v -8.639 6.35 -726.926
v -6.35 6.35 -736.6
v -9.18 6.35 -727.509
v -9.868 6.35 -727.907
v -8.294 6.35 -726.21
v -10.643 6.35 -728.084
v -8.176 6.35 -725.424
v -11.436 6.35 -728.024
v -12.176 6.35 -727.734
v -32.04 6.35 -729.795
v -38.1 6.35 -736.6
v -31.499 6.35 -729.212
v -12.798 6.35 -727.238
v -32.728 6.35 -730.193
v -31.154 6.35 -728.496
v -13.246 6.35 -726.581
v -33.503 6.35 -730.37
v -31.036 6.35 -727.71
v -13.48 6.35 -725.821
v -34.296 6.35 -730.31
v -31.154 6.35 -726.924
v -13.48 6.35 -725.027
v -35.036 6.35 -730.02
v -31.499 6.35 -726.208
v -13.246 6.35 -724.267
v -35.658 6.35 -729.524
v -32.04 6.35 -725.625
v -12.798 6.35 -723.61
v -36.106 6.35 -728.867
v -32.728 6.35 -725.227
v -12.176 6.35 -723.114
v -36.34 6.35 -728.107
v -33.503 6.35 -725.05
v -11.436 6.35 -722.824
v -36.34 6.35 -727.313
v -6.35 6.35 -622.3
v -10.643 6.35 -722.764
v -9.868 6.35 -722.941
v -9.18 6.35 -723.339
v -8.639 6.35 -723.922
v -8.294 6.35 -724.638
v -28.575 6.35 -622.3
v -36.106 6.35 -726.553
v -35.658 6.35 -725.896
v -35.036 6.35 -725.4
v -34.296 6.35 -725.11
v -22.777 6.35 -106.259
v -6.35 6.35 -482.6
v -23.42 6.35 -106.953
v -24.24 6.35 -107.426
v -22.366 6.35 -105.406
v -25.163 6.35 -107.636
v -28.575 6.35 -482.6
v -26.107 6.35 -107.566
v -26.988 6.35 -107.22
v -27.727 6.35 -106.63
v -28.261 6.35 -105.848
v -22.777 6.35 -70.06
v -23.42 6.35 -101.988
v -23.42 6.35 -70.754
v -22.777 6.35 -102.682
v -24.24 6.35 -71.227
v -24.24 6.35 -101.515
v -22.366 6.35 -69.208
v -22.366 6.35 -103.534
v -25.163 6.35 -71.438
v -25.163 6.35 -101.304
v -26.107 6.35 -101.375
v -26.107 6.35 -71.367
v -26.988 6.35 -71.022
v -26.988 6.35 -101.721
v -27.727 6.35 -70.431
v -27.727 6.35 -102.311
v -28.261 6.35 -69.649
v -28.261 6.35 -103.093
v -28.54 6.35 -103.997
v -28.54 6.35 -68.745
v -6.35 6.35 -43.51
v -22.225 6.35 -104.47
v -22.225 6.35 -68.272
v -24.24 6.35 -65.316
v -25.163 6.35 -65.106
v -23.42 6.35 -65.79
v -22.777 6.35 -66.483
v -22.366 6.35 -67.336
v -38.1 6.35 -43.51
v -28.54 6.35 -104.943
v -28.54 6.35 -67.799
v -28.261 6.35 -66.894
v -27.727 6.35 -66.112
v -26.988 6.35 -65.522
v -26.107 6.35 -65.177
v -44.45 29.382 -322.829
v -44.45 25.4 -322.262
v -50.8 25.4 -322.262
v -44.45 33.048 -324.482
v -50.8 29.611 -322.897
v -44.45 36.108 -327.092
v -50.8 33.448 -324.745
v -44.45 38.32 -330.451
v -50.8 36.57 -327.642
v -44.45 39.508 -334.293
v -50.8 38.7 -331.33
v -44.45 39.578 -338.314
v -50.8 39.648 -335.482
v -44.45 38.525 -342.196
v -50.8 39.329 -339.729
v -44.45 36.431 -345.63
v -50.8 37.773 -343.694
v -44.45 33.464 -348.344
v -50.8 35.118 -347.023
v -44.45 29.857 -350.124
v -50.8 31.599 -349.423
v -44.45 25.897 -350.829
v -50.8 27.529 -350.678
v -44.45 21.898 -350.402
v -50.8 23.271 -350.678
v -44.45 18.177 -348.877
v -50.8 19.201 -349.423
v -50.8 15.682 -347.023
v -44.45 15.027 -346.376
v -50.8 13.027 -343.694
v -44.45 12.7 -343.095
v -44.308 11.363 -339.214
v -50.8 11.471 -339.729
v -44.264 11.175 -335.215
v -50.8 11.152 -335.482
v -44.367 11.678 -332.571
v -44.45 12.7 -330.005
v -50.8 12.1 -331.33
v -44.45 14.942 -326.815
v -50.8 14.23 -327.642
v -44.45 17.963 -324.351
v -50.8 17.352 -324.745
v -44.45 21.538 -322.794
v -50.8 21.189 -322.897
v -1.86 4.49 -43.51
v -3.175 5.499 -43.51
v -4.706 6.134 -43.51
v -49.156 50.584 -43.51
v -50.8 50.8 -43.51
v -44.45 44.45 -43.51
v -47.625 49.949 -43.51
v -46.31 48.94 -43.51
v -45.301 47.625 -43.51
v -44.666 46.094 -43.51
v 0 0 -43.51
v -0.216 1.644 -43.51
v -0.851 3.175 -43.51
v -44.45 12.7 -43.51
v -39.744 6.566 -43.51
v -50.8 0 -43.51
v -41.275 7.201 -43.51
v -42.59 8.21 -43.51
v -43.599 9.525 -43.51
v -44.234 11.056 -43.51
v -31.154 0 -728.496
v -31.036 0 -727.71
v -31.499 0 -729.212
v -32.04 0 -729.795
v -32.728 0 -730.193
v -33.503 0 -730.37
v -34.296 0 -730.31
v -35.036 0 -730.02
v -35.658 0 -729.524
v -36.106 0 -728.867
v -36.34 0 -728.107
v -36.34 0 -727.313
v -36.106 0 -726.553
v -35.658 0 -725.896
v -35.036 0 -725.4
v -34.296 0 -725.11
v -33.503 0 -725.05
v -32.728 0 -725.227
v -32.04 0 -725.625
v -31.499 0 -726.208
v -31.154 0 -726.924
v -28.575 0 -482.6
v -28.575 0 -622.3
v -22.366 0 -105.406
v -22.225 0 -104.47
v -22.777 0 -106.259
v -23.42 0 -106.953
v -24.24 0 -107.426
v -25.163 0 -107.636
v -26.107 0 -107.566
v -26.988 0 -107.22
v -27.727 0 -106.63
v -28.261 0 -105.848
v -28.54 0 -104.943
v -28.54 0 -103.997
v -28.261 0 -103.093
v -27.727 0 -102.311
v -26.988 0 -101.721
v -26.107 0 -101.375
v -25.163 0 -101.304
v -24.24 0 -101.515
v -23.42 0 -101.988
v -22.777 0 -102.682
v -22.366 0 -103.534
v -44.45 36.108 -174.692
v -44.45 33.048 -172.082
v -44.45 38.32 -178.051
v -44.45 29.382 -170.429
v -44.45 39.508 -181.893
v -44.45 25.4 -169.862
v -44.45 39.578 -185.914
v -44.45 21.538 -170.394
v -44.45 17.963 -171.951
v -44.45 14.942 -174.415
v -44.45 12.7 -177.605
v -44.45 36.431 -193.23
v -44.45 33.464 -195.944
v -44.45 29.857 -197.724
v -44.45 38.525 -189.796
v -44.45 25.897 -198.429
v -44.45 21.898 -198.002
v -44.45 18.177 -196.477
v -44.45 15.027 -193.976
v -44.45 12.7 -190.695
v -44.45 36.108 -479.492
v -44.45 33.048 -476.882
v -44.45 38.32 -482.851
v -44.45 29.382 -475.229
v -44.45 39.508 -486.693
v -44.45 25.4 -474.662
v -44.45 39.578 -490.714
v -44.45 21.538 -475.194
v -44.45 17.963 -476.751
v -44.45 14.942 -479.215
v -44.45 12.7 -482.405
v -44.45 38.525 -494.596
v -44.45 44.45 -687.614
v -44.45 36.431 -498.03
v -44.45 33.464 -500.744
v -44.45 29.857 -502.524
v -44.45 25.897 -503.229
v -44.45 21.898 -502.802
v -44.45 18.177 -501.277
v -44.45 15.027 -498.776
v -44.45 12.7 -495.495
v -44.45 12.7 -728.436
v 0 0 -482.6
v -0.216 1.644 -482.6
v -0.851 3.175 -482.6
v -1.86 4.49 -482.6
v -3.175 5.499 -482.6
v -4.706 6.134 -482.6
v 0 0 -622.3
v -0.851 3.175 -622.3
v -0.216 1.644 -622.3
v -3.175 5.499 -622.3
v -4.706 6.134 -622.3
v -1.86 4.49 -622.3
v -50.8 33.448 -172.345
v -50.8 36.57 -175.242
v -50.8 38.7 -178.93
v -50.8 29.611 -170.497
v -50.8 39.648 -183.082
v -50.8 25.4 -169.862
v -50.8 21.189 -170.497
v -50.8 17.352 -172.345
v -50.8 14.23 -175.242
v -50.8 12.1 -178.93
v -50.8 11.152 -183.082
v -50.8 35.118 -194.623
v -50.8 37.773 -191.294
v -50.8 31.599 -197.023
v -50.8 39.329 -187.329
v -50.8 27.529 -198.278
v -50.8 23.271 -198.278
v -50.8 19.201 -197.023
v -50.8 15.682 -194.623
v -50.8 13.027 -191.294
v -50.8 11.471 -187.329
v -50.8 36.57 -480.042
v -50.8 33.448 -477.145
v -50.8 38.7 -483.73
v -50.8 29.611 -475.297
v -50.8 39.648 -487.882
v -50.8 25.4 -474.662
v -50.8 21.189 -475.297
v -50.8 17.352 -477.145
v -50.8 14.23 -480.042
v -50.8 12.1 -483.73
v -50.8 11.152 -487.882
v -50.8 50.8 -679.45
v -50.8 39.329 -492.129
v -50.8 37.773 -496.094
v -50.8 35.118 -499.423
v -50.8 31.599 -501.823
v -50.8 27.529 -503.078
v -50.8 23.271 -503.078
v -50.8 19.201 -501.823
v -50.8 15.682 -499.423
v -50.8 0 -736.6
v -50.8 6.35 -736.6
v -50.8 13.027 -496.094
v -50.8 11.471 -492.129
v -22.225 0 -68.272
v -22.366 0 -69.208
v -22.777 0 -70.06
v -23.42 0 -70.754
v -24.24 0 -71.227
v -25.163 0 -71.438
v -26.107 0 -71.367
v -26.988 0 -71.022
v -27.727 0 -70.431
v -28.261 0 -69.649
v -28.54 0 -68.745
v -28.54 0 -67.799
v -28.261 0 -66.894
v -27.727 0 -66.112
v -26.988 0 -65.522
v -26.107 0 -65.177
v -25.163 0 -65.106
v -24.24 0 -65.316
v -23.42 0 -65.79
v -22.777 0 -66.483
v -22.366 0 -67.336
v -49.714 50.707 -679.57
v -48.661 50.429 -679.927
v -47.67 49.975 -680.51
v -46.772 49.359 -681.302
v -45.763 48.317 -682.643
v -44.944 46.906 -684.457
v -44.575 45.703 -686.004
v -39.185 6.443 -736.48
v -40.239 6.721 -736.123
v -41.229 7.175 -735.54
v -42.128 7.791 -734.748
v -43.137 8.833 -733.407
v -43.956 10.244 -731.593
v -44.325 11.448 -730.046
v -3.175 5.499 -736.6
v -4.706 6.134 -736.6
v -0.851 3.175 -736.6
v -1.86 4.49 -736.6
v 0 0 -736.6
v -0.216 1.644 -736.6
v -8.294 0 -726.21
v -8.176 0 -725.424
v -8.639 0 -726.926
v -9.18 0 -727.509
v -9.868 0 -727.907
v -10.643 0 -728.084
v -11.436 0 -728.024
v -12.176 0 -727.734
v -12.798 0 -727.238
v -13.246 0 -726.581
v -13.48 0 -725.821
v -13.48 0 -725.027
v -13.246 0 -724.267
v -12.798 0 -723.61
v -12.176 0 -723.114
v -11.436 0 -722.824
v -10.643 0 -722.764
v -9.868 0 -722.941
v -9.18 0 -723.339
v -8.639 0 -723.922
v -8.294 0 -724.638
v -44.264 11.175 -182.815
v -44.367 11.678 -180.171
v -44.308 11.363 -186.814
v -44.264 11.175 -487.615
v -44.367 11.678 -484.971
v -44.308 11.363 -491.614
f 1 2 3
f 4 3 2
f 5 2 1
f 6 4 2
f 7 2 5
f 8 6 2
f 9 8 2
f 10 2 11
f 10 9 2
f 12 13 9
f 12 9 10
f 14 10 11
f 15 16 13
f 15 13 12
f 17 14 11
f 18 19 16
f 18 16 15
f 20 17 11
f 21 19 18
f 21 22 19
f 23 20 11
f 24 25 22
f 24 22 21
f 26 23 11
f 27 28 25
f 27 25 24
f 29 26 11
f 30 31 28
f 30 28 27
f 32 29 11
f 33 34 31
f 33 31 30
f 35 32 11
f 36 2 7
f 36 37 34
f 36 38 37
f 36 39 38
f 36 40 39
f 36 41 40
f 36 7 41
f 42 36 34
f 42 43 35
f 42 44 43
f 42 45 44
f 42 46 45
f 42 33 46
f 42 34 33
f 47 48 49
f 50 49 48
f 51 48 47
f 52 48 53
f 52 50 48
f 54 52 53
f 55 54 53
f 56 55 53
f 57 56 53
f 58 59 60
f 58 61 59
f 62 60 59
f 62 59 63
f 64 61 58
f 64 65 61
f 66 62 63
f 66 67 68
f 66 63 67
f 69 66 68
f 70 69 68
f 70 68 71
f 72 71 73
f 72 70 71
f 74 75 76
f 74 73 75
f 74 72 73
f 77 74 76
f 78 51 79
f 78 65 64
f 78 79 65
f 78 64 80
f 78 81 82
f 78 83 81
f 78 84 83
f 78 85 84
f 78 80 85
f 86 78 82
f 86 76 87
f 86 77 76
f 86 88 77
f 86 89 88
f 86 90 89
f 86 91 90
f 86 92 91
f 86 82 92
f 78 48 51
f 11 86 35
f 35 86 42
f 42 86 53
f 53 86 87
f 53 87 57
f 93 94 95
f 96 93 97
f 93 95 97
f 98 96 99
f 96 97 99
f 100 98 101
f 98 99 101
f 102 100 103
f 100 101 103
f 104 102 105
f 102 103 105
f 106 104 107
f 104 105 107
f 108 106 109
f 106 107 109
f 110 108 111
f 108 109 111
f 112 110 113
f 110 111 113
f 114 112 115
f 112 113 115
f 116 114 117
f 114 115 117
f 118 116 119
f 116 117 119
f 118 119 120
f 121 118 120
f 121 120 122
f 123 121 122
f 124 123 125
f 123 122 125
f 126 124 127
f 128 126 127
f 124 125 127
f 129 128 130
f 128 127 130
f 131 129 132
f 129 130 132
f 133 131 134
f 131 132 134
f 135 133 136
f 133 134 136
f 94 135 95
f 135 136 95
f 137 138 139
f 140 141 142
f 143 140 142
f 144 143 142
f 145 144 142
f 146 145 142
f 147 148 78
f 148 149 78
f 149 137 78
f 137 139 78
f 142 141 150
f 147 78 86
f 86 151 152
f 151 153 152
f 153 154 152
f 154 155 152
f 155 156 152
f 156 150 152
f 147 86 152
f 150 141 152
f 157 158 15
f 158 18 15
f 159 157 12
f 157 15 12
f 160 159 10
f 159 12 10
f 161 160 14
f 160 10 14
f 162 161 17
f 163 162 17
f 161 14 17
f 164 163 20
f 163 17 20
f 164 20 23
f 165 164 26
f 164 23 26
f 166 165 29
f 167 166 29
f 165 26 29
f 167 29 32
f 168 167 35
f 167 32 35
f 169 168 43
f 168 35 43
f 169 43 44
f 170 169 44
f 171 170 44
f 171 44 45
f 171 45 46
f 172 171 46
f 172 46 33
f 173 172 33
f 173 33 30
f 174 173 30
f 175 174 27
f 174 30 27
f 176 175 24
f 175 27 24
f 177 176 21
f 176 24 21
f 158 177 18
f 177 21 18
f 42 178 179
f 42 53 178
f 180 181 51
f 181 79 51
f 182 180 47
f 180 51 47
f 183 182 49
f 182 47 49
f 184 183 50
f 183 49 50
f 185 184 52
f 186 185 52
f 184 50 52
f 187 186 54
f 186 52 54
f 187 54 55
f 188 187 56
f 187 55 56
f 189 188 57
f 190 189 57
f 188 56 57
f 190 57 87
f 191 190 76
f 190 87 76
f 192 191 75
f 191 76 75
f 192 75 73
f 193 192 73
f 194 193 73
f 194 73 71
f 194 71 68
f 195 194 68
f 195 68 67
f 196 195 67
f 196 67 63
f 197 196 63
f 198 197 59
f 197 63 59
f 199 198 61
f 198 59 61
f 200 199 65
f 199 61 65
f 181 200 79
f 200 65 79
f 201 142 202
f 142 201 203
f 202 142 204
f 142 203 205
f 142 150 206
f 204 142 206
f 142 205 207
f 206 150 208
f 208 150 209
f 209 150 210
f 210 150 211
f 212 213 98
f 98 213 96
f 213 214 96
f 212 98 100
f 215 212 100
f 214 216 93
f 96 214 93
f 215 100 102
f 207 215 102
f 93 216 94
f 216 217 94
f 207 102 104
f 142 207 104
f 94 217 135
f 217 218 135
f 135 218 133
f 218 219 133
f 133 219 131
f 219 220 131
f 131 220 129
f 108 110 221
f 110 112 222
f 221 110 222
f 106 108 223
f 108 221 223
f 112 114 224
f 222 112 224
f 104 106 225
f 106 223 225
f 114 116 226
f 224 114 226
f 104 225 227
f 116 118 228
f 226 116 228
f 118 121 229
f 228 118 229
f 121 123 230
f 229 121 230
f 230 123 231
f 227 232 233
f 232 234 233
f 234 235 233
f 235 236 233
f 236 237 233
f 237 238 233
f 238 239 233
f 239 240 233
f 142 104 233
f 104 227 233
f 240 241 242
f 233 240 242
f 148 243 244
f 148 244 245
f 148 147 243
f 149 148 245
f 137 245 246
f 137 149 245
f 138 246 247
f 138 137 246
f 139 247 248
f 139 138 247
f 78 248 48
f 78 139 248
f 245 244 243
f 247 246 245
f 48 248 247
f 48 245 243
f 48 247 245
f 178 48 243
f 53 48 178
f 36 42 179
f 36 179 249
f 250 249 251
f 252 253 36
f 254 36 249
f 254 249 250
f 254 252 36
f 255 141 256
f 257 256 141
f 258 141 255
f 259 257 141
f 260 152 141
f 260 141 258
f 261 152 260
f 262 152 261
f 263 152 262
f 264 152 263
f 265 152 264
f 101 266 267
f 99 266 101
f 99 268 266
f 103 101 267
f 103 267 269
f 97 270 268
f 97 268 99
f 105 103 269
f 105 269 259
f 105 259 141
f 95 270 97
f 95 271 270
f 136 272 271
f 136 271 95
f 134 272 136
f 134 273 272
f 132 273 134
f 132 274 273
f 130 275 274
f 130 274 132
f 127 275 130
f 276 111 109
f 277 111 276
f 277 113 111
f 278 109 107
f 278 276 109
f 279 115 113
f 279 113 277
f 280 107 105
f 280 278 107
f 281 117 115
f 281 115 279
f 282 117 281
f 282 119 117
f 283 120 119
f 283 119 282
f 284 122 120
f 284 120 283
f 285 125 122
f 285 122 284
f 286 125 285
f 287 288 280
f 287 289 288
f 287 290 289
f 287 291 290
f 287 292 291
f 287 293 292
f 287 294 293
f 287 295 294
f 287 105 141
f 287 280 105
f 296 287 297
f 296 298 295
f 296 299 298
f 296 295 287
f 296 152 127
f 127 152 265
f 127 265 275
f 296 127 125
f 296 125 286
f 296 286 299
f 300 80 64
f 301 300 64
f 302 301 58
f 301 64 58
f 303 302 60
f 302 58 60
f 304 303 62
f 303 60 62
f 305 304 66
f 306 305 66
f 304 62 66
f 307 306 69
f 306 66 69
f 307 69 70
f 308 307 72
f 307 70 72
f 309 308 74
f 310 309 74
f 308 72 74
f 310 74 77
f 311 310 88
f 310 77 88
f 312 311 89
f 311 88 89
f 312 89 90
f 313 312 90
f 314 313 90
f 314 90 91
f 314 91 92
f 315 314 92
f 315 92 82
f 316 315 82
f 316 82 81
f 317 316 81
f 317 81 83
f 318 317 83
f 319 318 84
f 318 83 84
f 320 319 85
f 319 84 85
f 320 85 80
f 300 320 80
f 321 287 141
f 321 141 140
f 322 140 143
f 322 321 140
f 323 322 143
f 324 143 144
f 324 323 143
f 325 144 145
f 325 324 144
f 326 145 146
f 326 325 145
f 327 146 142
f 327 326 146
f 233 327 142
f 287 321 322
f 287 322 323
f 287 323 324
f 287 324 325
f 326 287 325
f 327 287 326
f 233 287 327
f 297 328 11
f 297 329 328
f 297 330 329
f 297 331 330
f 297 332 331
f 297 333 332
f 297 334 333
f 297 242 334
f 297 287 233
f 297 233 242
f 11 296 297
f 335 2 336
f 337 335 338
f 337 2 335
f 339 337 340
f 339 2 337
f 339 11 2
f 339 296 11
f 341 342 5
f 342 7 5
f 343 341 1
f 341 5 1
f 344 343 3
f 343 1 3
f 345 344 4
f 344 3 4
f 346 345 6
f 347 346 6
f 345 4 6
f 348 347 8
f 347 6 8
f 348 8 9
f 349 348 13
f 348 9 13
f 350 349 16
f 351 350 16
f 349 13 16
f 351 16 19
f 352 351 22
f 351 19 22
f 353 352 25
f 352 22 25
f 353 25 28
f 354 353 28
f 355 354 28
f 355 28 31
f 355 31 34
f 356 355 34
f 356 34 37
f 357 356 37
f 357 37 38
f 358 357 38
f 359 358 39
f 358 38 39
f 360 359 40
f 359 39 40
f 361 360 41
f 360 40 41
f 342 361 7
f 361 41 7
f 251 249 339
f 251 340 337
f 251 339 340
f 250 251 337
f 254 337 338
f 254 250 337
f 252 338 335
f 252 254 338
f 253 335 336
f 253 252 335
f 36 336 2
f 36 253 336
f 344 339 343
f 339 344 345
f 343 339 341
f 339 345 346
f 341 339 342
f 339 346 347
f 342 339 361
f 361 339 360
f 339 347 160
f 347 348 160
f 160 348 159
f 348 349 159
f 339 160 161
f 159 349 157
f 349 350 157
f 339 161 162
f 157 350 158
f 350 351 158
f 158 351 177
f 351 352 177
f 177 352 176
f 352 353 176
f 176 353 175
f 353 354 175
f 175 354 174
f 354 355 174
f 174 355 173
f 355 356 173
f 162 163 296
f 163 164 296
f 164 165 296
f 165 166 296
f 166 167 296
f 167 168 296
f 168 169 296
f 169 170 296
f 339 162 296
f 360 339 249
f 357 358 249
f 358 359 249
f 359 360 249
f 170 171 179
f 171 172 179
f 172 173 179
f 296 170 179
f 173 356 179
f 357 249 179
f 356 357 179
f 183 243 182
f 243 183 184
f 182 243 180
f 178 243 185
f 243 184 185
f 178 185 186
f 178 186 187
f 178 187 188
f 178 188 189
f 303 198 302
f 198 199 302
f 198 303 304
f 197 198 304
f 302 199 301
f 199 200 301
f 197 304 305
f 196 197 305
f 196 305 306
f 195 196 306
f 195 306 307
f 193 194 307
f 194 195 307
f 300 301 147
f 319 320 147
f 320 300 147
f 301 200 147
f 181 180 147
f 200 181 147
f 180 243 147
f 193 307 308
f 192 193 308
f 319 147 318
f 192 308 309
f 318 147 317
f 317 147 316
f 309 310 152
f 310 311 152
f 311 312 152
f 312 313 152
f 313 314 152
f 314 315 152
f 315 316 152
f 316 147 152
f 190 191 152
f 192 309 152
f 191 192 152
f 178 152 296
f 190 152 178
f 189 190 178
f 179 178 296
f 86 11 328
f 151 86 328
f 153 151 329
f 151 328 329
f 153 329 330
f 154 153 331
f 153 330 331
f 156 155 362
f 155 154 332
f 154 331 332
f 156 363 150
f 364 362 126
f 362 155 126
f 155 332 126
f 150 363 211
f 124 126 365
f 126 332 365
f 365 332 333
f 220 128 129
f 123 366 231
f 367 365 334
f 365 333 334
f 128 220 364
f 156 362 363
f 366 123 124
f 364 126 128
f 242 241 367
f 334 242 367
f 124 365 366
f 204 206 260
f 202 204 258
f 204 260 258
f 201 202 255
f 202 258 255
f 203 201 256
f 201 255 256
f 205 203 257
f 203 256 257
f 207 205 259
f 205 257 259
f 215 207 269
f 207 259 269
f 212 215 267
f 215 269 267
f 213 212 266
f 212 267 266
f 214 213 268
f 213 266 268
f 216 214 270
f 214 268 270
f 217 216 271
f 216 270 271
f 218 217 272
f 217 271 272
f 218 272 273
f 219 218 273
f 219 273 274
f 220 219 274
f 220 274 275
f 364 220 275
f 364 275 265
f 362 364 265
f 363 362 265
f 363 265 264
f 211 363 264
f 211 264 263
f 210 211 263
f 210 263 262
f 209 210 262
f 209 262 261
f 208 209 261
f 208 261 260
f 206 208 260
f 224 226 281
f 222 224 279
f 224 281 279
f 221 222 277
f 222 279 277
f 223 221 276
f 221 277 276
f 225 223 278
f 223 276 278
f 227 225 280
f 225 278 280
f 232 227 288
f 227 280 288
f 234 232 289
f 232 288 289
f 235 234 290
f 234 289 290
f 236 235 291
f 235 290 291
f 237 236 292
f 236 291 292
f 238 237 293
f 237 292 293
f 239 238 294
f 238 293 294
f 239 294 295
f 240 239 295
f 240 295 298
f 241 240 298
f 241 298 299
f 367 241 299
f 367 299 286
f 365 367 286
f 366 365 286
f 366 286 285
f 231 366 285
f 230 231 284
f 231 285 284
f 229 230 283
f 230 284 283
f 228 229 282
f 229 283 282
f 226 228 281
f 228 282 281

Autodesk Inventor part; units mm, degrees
ref_plane "YZ Plane" through (0, 0, 0) normal (1, 0, 0) x (0, 1, 0)
ref_plane "XZ Plane" through (0, 0, 0) normal (0, 1, 0) x (-1, 0, 0)
ref_plane "XY Plane" through (0, 0, 0) normal (0, 0, 1) x (1, 0, 0)
sketch "Sketch1" plane through (0, 0, 0) normal (0, 1, 0) x (-1, 0, 0)
  line L0 (0, 0) -> (50.8, 0)
  line L1 (50.8, 0) -> (50.8, -736.6)
  line L2 (50.8, -736.6) -> (0, -736.6)
  line L3 (0, -736.6) -> (0, 0)
  dimension "d0" = 50.8
  dimension "d1" = 736.6
extrude "Extrusion1" add sketch "Sketch1" along normal blind 6.35
sketch "Sketch2" plane through (0, 6.35, 0) normal (0, 1, 0) x (1, 0, 0)
  line L0 (-50.8, 0) -> (-44.45, 0)
  line L1 (-50.8, 0) -> (0, 0) projected
  line L2 (-44.45, 0) -> (-44.45, 736.6)
  line L3 (0, 736.6) -> (-50.8, 736.6) projected
  line L4 (-44.45, 736.6) -> (-50.8, 736.6)
  line L5 (-50.8, 736.6) -> (-50.8, 0)
  line L6 (-50.8, 0) -> (-44.45, 0)
  dimension "d4" = 6.35
  dimension "d5" = 736.6
  dimension "d6" = 736.6
extrude "Extrusion2" add sketch "Sketch2" along normal blind 44.45
fillet "Fillet1" radius 6.35 1 edges at (-44.45, 6.35, -368.3)
fillet "Fillet2" radius 6.35 1 edges at (0, 6.35, -368.3)
fillet "Fillet3" radius 6.35 1 edges at (-44.45, 50.8, -368.3)
hole "Hole1" at (-44.45, 25.4, -184.15) direction (-1, 0, 0) diameter 14.605 end through all
pattern_linear "Rectangular Pattern1" count 3 spacing 152.4 along (0, 0, -1) of "Hole1"
sketch "Sketch4" plane through (-44.45, 12.7, 0) normal (1, 0, 0) x (0, 0, -1)
  line L0 (43.5102, 15.9813) -> (43.5102, 68.613)
  line L1 (43.5102, 68.613) -> (43.5102, -117.0764)
  line L2 (43.5102, -117.0764) -> (-179.7757, -29.554)
  line L3 (-179.7757, -29.554) -> (-128.9181, 50.2806)
  line L4 (-128.9181, 50.2806) -> (-52.0403, 93.4505)
  line L5 (-52.0403, 93.4505) -> (43.5102, 68.613)
  point P0 (0, -12.7)
extrude "Extrusion3" cut sketch "Sketch4" along normal through all both and the other way through all
sketch "Sketch6" plane through (-50.8, 0, -736.6) normal (-1, 0, 0) x (0, 0, 1)
  line L0 (0, 0) -> (31.75, 0)
  line L1 (693.0898, 0) -> (0, 0) projected
  line L2 (31.75, 0) -> (31.75, 50.8)
  line L3 (0, 50.8) -> (693.0898, 50.8) projected
  line L4 (0, 0) -> (0, 19.05)
  line L5 (0, 0) -> (0, 50.8) projected
  line L6 (0, 19.05) -> (31.75, 50.8)
  line L7 (31.75, 87.3968) -> (-26.0736, 76.8736)
  line L8 (-26.0736, 76.8736) -> (-32.5199, 38.9128)
  line L9 (-32.5199, 38.9128) -> (0, 19.05)
  line L10 (31.75, 87.3968) -> (31.75, 50.8)
  point P0 (736.6, 0)
  dimension "d38" = 31.75
  dimension "d39" = 19.05
extrude "Extrusion4" cut sketch "Sketch6" against normal blind 304.8 contours L5 L3 L6
sketch "Sketch7" plane through (-50.8, 0, -736.6) normal (-1, 0, 0) x (0, 0, 1)
  line L0 (0, 0) -> (0, 6.35)
  line L1 (0, 0) -> (0, 19.05) projected
  line L2 (0, 6.35) -> (0, 61.7609)
  line L3 (0, 61.7609) -> (31.75, 50.8)
  line L4 (31.75, 50.8) -> (57.15, 50.8)
  line L5 (31.75, 50.8) -> (693.0898, 50.8) projected
  line L6 (57.15, 50.8) -> (0, 6.35)
  point P0 (736.6, 0)
  dimension "d42" = 6.35
  dimension "d43" = 25.4
extrude "Extrusion5" cut sketch "Sketch7" against normal blind 304.8
sketch "Sketch10" plane through (0, 6.35, 0) normal (0, 1, 0) x (1, 0, 0)
  circle A0 centre (-10.8427, 725.424) radius 2.667
  circle A1 centre (-33.7027, 727.71) radius 2.667
  point P0 (0, 0)
extrude "Extrusion6" cut sketch "Sketch10" against normal blind 25.4
sketch "Sketch12" plane through (-50.8, 0, -736.6) normal (-1, 0, 0) x (0, 0, 1)
  circle A0 centre (400.05, 25.4) radius 7.3025 projected
  circle A1 centre (552.45, 25.4) radius 7.3025 projected
  circle A2 centre (247.65, 25.4) radius 7.3025 projected
  circle A3 centre (247.65, 25.4) radius 14.2875
  circle A4 centre (400.05, 25.4) radius 14.2875
  circle A5 centre (552.45, 25.4) radius 14.2875
  point P0 (736.6, 0)
  dimension "d48" = 28.575
  dimension "d49" = 28.575
  dimension "d50" = 28.575
extrude "Extrusion7" cut sketch "Sketch12" against normal blind 25.4
sketch "Sketch13" plane through (0, 6.35, 0) normal (0, 1, 0) x (1, 0, 0)
  circle A0 centre (-25.4, 68.2719) radius 3.175
  circle A1 centre (-25.4, 104.4702) radius 3.175
  point P0 (0, 0)
extrude "Extrusion8" cut sketch "Sketch13" against normal blind 25.4
sketch "Sketch14" plane through (0, 6.35, 0) normal (0, 1, 0) x (1, 0, 0)
  circle A0 centre (-25.4, 68.2719) radius 3.175 projected
  circle A1 centre (-25.4, 104.4702) radius 3.175 projected
  circle A2 centre (-10.8427, 725.424) radius 2.667 projected
  circle A3 centre (-33.7027, 727.71) radius 2.667 projected
  line L0 (-38.1, 43.5102) -> (-6.35, 43.5102) projected
  line L1 (-6.35, 736.6) -> (-6.35, 43.5102) projected
  line L2 (-6.35, 736.6) -> (-38.1, 736.6) projected
  line L3 (-38.1, 43.5102) -> (-38.1, 736.6) projected
  line L4 (-6.35, 43.5102) -> (0, 43.5102) projected
  line L5 (0, 736.6) -> (0, 43.5102) projected
  line L6 (0, 736.6) -> (-6.35, 736.6) projected
  line L7 (-6.35, 736.6) -> (-6.35, 43.5102) projected
  line L8 (11.781, 501.9003) -> (-12.6385, 502.7611)
  line L9 (-13.1288, 510.961) -> (-13.1288, 506.3701)
  line L10 (-13.1288, 503.6795) -> (-13.1288, 506.3701)
  ellipse E0 centre (-12.6208, 503.2688) end of major axis (-12.1128, 503.2688) minor radius 0.508 (-13.1288, 503.2688) -> (-12.6385, 502.7611) ccw
  line L11 (-13.1288, 518.5072) -> (-13.1288, 510.961)
  line L12 (-13.1288, 526.3619) -> (-13.1288, 520.4519)
  line L13 (-13.1288, 518.5844) -> (-13.1288, 520.4519)
  line L14 (-21.3838, 525.728) -> (-6.0168, 525.728)
  line L15 (-21.3838, 530.5032) -> (-21.3838, 525.728)
  line L16 (-21.3838, 530.5032) -> (-6.0168, 530.5032)
  line L17 (-13.9225, 584.3659) -> (-13.9225, 520.3579)
  line L18 (-15.6688, 579.6293) -> (-15.6688, 550.0287)
  line L19 (-21.8918, 577.0337) -> (-21.8918, 580.7929)
  line L20 (-15.6688, 589.4756) -> (-15.6688, 583.2973)
  line L21 (-14.1739, 593.5184) -> (5.7789, 610.1541)
  line L22 (-13.4799, 597.3719) -> (6.1422, 615.7328)
  line L23 (0, 736.6) -> (0, 43.5102) projected
  line L24 (0, 482.6) -> (-28.575, 482.6)
  line L25 (-28.575, 482.6) -> (-28.575, 622.3)
  line L26 (-28.575, 622.3) -> (0, 622.3)
  line L27 (0, 622.3) -> (0, 482.6)
  point P0 (0, 0)
  dimension "d55" = 139.7
extrude "Extrusion9" cut sketch "Sketch14" against normal blind 6.35 contours L24 L25 L26 L1 L16 L15 L14 | L1 L8 L5 L24 | L1 L21 L5 L8 | L26 L5 L22 L1 | L14 L17 L16 L1 | L22 L5 L21 L1 | L17 L14 L15 L16
properties part number "2x2 quarter in angle aluminum far side"
